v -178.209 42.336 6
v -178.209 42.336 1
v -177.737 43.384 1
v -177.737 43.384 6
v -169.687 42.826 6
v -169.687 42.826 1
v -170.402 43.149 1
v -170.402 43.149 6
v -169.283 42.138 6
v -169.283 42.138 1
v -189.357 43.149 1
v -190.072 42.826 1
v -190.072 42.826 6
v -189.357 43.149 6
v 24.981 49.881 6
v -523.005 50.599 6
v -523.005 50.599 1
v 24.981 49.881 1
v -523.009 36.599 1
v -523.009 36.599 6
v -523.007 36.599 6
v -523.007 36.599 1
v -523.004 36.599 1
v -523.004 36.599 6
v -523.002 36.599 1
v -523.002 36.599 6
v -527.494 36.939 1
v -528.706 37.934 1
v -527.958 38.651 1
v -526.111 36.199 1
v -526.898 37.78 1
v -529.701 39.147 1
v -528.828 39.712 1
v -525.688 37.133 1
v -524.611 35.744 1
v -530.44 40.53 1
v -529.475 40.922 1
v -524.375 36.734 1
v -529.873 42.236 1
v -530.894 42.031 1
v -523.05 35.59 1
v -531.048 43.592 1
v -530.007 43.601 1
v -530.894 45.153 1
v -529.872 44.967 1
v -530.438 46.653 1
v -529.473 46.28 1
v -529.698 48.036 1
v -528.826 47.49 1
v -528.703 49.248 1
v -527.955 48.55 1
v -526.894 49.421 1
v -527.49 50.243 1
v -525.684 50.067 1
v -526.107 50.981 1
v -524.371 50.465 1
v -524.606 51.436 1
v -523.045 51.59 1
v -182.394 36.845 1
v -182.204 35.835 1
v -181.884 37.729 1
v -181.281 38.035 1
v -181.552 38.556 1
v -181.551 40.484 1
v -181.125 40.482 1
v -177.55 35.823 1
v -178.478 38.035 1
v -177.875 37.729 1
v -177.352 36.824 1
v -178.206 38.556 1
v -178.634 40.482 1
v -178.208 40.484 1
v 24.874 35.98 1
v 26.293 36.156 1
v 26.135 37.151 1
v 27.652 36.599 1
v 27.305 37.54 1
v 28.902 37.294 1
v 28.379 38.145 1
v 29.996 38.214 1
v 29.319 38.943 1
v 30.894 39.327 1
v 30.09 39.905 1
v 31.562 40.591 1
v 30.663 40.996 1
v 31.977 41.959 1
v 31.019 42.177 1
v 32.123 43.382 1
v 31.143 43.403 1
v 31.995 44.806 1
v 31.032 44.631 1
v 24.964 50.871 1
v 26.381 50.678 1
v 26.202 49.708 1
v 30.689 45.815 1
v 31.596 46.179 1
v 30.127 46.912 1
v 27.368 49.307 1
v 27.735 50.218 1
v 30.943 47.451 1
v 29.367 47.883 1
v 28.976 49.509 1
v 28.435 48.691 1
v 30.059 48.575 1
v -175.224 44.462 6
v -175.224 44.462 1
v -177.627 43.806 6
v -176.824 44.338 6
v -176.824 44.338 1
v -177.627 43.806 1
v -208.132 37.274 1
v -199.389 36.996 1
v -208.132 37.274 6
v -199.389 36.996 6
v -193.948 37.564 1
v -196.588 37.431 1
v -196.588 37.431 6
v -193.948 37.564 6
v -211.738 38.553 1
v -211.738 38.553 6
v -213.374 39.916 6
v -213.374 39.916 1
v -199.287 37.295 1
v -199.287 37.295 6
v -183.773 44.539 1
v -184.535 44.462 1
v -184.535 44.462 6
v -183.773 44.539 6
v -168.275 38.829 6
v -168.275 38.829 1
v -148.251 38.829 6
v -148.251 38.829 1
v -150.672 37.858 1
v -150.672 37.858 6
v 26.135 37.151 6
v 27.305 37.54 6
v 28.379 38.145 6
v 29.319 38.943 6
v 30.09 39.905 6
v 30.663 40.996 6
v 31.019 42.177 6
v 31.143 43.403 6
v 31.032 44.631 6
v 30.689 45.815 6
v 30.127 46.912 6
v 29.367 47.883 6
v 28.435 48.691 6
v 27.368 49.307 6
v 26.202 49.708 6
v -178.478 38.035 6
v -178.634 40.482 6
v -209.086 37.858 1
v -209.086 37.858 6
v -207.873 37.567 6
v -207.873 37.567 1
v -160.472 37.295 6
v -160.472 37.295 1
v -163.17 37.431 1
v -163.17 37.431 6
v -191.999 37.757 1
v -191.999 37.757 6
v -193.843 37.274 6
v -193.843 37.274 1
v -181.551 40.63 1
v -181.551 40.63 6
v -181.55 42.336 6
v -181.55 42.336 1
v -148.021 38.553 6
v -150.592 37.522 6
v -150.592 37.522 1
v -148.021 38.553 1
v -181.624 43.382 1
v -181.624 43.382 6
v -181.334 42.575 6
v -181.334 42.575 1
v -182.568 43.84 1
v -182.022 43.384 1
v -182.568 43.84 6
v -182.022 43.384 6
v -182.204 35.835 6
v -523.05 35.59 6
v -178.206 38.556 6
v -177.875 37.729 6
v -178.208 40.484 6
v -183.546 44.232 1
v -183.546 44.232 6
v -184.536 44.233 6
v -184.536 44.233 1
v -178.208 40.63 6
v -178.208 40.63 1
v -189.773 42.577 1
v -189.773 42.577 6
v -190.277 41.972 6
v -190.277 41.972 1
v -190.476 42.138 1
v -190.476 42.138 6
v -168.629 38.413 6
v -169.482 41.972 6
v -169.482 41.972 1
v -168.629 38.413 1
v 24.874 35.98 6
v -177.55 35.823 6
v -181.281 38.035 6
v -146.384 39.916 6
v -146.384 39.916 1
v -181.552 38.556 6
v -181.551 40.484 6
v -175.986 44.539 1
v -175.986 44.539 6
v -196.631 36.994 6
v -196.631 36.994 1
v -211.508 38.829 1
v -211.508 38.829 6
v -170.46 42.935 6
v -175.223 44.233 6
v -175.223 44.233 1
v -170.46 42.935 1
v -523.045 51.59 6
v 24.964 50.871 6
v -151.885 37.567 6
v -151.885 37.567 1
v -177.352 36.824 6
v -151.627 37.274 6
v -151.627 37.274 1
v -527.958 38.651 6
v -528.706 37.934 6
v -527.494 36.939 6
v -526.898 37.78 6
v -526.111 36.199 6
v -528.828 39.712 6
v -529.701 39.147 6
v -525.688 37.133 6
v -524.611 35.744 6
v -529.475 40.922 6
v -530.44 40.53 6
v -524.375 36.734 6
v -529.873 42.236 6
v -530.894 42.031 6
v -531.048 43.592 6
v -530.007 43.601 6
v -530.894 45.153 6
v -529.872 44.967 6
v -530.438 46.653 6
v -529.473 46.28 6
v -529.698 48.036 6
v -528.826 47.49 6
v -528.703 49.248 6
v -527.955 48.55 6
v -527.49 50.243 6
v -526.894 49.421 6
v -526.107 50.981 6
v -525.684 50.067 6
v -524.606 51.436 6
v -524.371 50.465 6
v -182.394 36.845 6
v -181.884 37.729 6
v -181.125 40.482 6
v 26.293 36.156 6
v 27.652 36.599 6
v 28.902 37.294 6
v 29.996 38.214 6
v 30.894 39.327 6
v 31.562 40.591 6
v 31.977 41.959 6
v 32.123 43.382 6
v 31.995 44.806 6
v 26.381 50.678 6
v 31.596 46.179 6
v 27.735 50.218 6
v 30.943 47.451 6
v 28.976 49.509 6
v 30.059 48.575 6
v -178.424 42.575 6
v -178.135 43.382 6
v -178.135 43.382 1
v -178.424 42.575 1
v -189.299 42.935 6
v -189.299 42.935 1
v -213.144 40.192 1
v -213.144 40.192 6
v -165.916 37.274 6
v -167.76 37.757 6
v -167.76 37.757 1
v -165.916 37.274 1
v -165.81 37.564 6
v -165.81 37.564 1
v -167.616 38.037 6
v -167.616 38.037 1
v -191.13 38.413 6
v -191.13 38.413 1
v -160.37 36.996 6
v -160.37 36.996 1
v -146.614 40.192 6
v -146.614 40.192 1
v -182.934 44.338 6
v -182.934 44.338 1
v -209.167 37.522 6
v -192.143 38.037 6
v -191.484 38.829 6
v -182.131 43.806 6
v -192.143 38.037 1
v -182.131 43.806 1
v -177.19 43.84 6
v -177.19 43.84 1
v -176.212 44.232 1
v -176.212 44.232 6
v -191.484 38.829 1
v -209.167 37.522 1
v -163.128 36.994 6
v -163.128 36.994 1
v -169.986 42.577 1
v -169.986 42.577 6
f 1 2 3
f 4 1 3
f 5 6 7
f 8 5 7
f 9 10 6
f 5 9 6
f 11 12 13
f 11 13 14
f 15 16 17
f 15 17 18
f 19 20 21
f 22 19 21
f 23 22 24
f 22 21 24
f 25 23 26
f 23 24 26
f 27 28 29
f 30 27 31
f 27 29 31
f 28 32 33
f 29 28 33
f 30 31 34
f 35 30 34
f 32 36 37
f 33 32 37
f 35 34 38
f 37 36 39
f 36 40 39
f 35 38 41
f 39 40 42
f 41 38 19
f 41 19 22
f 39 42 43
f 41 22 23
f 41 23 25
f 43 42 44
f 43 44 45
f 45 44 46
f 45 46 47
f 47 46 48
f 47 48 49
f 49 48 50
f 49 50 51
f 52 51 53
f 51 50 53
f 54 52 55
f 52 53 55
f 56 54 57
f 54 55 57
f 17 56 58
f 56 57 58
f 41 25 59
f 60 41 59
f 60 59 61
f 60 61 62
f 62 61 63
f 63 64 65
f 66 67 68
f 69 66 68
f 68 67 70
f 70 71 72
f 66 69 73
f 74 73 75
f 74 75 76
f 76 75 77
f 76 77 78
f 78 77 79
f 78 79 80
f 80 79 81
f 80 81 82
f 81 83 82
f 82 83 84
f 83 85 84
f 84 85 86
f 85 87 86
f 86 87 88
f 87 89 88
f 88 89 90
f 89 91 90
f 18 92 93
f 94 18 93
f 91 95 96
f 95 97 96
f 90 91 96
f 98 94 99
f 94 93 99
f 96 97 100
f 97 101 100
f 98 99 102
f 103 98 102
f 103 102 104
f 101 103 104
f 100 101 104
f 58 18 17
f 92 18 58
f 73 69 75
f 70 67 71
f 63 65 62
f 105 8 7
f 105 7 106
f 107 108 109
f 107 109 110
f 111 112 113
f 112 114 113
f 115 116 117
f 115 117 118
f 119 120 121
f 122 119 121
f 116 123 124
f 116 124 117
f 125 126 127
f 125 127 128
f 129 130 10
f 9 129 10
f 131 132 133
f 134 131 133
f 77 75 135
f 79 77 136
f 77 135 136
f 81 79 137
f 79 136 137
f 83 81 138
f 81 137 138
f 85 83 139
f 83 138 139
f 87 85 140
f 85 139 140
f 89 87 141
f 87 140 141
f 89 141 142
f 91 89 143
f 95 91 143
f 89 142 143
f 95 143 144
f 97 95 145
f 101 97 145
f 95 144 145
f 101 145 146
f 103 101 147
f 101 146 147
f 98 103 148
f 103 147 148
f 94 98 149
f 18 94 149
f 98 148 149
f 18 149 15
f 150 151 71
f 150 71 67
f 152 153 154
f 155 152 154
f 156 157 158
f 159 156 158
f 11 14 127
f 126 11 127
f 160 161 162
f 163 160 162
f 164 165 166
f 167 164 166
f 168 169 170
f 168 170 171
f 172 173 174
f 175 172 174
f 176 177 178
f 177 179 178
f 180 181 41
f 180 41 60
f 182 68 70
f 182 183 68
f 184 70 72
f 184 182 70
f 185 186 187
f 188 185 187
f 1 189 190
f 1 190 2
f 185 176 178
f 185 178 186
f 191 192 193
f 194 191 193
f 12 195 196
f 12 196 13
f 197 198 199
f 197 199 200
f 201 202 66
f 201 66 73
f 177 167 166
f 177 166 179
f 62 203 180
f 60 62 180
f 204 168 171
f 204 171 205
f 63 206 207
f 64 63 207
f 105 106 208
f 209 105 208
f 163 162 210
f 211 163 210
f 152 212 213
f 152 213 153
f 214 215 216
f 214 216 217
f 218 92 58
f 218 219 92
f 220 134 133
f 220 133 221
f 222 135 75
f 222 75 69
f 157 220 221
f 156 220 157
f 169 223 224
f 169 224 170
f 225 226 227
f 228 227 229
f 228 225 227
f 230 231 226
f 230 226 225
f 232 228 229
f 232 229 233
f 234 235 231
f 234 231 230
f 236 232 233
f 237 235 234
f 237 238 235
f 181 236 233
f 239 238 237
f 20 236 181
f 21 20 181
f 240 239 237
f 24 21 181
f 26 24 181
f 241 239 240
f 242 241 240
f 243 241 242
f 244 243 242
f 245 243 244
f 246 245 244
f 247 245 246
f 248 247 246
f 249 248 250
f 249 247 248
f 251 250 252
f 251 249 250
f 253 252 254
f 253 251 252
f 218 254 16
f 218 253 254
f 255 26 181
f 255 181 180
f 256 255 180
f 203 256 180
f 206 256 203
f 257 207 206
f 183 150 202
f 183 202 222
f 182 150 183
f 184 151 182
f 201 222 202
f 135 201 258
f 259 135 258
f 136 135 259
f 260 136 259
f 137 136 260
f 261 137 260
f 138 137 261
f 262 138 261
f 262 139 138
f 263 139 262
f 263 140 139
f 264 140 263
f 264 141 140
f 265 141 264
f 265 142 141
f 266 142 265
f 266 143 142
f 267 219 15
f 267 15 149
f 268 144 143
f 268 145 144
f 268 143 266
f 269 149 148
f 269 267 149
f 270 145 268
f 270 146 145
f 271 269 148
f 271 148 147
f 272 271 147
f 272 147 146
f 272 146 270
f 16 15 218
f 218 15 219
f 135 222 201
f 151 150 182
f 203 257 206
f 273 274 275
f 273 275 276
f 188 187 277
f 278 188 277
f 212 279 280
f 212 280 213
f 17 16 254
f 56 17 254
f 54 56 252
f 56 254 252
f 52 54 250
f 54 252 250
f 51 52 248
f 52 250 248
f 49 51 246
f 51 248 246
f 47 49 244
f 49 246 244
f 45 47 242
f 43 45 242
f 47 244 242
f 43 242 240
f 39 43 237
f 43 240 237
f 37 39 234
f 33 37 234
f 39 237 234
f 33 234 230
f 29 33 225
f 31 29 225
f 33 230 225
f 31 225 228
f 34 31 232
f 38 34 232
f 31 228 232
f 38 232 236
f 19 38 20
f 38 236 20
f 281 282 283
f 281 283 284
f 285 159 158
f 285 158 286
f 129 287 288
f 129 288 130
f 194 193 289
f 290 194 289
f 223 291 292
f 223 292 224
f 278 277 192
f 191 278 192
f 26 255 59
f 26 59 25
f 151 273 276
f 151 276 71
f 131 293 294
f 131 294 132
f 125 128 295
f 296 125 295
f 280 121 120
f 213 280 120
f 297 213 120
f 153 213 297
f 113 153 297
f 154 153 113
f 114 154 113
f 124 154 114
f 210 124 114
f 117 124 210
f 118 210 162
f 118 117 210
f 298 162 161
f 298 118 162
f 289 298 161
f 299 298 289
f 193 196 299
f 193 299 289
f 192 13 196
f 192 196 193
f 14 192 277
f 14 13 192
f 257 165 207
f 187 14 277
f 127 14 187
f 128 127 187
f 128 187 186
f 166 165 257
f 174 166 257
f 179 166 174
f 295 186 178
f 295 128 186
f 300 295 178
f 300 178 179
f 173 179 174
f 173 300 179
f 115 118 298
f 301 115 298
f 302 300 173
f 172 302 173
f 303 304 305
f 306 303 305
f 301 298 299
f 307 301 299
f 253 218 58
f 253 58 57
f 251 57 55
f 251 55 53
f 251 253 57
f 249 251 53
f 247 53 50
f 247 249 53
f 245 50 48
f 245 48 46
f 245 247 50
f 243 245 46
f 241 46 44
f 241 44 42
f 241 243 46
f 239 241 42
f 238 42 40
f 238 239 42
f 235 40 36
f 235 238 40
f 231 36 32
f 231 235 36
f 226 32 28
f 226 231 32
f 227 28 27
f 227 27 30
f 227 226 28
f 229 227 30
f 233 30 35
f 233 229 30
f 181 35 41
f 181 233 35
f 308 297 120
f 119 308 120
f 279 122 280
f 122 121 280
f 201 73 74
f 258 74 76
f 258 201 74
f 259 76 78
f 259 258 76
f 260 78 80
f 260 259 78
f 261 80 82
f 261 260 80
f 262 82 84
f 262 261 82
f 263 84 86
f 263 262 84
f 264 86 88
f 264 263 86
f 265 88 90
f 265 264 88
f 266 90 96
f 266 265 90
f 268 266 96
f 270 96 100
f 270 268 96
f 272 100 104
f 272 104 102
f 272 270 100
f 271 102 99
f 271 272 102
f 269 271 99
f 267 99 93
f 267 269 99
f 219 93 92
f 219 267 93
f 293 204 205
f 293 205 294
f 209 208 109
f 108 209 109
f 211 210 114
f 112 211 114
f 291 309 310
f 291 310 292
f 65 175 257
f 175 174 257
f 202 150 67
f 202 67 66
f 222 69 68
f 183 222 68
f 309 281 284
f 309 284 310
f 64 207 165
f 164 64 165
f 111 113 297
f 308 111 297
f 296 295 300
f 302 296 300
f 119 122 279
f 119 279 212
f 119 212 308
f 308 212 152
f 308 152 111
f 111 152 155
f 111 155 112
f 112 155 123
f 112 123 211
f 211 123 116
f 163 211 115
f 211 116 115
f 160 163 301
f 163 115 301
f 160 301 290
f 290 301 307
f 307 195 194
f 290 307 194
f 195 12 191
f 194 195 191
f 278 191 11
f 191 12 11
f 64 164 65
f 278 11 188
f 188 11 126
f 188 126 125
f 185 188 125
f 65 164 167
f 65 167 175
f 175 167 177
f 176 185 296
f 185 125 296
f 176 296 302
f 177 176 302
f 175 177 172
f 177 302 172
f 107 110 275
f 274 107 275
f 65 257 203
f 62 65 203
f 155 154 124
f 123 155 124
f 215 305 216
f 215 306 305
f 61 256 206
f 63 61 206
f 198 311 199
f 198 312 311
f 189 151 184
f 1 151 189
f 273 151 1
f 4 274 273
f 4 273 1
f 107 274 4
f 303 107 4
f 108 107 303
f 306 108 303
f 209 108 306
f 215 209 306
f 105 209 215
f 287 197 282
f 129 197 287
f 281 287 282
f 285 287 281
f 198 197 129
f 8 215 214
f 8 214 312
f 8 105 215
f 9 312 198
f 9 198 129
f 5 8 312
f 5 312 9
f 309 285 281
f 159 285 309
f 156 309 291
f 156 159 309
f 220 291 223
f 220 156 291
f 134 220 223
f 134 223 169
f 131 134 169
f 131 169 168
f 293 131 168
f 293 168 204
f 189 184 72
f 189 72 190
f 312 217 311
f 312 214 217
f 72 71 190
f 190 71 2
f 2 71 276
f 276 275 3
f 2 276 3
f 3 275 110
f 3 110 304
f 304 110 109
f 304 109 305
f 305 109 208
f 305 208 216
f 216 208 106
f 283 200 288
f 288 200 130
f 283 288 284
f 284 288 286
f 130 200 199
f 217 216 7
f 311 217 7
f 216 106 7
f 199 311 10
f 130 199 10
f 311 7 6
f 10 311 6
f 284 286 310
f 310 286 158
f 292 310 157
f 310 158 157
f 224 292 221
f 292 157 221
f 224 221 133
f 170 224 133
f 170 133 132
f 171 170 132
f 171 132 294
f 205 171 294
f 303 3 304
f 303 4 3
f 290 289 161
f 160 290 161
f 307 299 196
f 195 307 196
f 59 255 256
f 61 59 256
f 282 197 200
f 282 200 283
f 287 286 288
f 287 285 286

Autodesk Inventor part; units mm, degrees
ref_plane "YZ Plane" through (0, 0, 0) normal (1, 0, 0) x (0, 1, 0)
ref_plane "XZ Plane" through (0, 0, 0) normal (0, 1, 0) x (-1, 0, 0)
ref_plane "XY Plane" through (0, 0, 0) normal (0, 0, 1) x (1, 0, 0)
ref_plane "Work Plane1" through (0, 0, 0) normal (0, 0, 1) x (1, 0, 0)
sketch "Sketch1" plane through (0, 0, 0) normal (0, 0, 1) x (1, 0, 0)
  arc A0 (24.6543, 36.9901) -> (24.6581, 49.8888) centre (24.6562, 43.4394) ccw
  arc A1 (-523.0049, 50.5993) -> (-523.009, 36.5993) centre (-523.014, 43.5993) ccw
  line L0 (-523.009, 36.5993) -> (24.8958, 36.9945)
  line L1 (24.9813, 49.8806) -> (-523.0049, 50.5993)
  line L2 (-523.0083, 35.5993) -> (24.9141, 35.9946)
  arc A2 (24.655, 35.9901) -> (24.666, 50.8888) centre (24.6562, 43.4394) ccw
  arc A3 (-523.0035, 51.5993) -> (-523.0083, 35.5993) centre (-523.014, 43.5993) ccw
  line L3 (-523.0035, 51.5993) -> (25.0062, 50.8806)
  point P0 (0, 0)
  dimension "d0" = 1
ref_plane "Work Plane2" through (0, 0, 6) normal (0, 0, 1) x (1, 0, 0)
sketch "Sketch2" plane through (0, 0, 6) normal (0, 0, 1) x (1, 0, 0)
  line L0 (-523.0049, 50.5993) -> (24.9813, 49.8806)
  arc A0 (26.1347, 37.1513) -> (24.9813, 49.8806) centre (24.6937, 43.4377) ccw
  arc A1 (-523.0049, 50.5993) -> (-523.0019, 36.5993) centre (-523.0069, 43.5993) ccw
  line L1 (-523.0501, 35.5895) -> (-182.2036, 35.8354)
  arc A2 (24.8737, 35.9804) -> (24.9644, 50.8708) centre (24.674, 43.4271) ccw
  line L2 (24.9644, 50.8708) -> (-523.0453, 51.5895)
  arc A3 (-523.0453, 51.5895) -> (-523.0501, 35.5895) centre (-523.0477, 43.5895) ccw
  line L3 (26.1347, 37.1513) -> (-177.3524, 36.8243)
  line L4 (26.1347, 37.1513) -> (-177.3524, 36.8243)
  line L5 (-177.55, 35.8233) -> (24.8737, 35.9804)
  line L6 (-182.3943, 36.845) -> (-523.0019, 36.5993)
  line L7 (-182.3943, 36.845) -> (-523.0019, 36.5993)
  line L8 (-182.3943, 36.845) -> (-523.009, 36.5993)
  arc A4 (-175.5981, 44.0056) -> (-177.8793, 42.0255) centre (-175.8793, 42.0255) ccw projected
  line L9 (-177.8793, 42.0255) -> (-177.8793, 38.1674) projected
  line L10 (-168.9783, 38.1674) -> (-177.8793, 38.1674) projected
  arc A5 (-168.9783, 38.1674) -> (-168.8741, 38.8755) centre (-169.5783, 38.6174) ccw projected
  line L11 (-168.8741, 38.8755) -> (-169.5014, 41.4937) projected
  arc A6 (-169.5014, 41.4937) -> (-170.852, 42.9373) centre (-171.4464, 41.0276) ccw projected
  arc A7 (-170.852, 42.9373) -> (-175.5981, 44.0056) centre (-179.8602, 13.9956) ccw projected
  arc A8 (-181.8793, 42.02) -> (-184.1633, 43.9998) centre (-183.8793, 42.02) ccw projected
  arc A9 (-184.1633, 43.9998) -> (-188.8754, 42.9351) centre (-179.8602, 13.9956) ccw projected
  arc A10 (-188.8754, 42.9351) -> (-190.223, 41.5019) centre (-188.2805, 41.0256) ccw projected
  line L12 (-190.223, 41.5019) -> (-190.8453, 38.9643) projected
  arc A11 (-190.8453, 38.9643) -> (-190.7804, 38.1674) centre (-190.1804, 38.6174) ccw projected
  line L13 (-181.8793, 38.1674) -> (-190.7804, 38.1674) projected
  line L14 (-181.8793, 42.02) -> (-181.8793, 38.1674) projected
  line L15 (-177.3524, 36.8243) -> (-177.8746, 37.7286)
  line L16 (-177.8746, 37.7286) -> (-178.2063, 38.5555)
  line L17 (-178.2063, 38.5555) -> (-178.2078, 40.6305)
  line L18 (-178.2078, 40.6305) -> (-178.209, 42.3362)
  line L19 (-178.209, 42.3362) -> (-177.737, 43.3845)
  line L20 (-177.737, 43.3845) -> (-177.1904, 43.8398)
  line L21 (-177.1904, 43.8398) -> (-176.2125, 44.2321)
  line L22 (-176.2125, 44.2321) -> (-175.2227, 44.2328)
  line L23 (-175.2227, 44.2328) -> (-170.4599, 42.9351)
  line L24 (-170.4599, 42.9351) -> (-169.9859, 42.5772)
  line L25 (-169.9859, 42.5772) -> (-169.4819, 41.9721)
  line L26 (-169.4819, 41.9721) -> (-168.629, 38.4129)
  line L27 (-168.629, 38.4129) -> (-167.76, 37.7567)
  line L28 (-167.76, 37.7567) -> (-165.9159, 37.2737)
  line L29 (-165.9159, 37.2737) -> (-163.1275, 36.9945)
  line L30 (-163.1275, 36.9945) -> (-160.3695, 36.9965)
  line L31 (-160.3695, 36.9965) -> (-151.627, 37.2737)
  line L32 (-151.627, 37.2737) -> (-150.5918, 37.5217)
  line L33 (-150.5918, 37.5217) -> (-148.0211, 38.5527)
  line L34 (-148.0211, 38.5527) -> (-146.3842, 39.9163)
  line L35 (-146.3842, 39.9163) -> (-146.6143, 40.1925)
  line L36 (-146.6143, 40.1925) -> (-148.2512, 38.8289)
  line L37 (-148.2512, 38.8289) -> (-150.6724, 37.8579)
  line L38 (-150.6724, 37.8579) -> (-151.8853, 37.5672)
  line L39 (-151.8853, 37.5672) -> (-160.472, 37.295)
  line L40 (-160.472, 37.295) -> (-163.1702, 37.4311)
  line L41 (-163.1702, 37.4311) -> (-165.8102, 37.5643)
  line L42 (-165.8102, 37.5643) -> (-167.6157, 38.0372)
  line L43 (-167.6157, 38.0372) -> (-168.2752, 38.8289)
  line L44 (-168.2752, 38.8289) -> (-169.2827, 42.138)
  line L45 (-169.2827, 42.138) -> (-169.6866, 42.8265)
  line L46 (-169.6866, 42.8265) -> (-170.4021, 43.1486)
  line L47 (-170.4021, 43.1486) -> (-175.2236, 44.4623)
  line L48 (-175.2236, 44.4623) -> (-175.9859, 44.5387)
  line L49 (-175.9859, 44.5387) -> (-176.8242, 44.3378)
  line L50 (-176.8242, 44.3378) -> (-177.6272, 43.8055)
  line L51 (-177.6272, 43.8055) -> (-178.135, 43.3825)
  line L52 (-178.135, 43.3825) -> (-178.4245, 42.5752)
  line L53 (-178.4245, 42.5752) -> (-178.6341, 40.4815)
  line L54 (-178.6341, 40.4815) -> (-178.4776, 38.0352)
  line L55 (-178.4776, 38.0352) -> (-177.55, 35.8233)
  line L56 (-177.8793, 40.4835) -> (-181.8793, 40.4835)
  line L57 (-179.8793, 40.4835) -> (-179.8793, 39.2603)
  arc A12 (-181.8793, 42.0255) -> (-184.1606, 44.0056) centre (-183.8793, 42.0255) ccw
  line L58 (-181.8793, 42.0255) -> (-181.8793, 38.1674)
  line L59 (-190.7804, 38.1674) -> (-181.8793, 38.1674)
  arc A13 (-190.8846, 38.8755) -> (-190.7804, 38.1674) centre (-190.1804, 38.6174) ccw
  line L60 (-190.8846, 38.8755) -> (-190.2572, 41.4937)
  arc A14 (-188.9067, 42.9373) -> (-190.2572, 41.4937) centre (-188.3123, 41.0276) ccw
  arc A15 (-184.1606, 44.0056) -> (-188.9067, 42.9373) centre (-179.8985, 13.9956) ccw
  line L61 (-182.3943, 36.845) -> (-181.8841, 37.7286)
  line L62 (-181.8841, 37.7286) -> (-181.5524, 38.5555)
  line L63 (-181.5524, 38.5555) -> (-181.5509, 40.6305)
  line L64 (-181.5509, 40.6305) -> (-181.5497, 42.3362)
  line L65 (-181.5497, 42.3362) -> (-182.0217, 43.3845)
  line L66 (-182.0217, 43.3845) -> (-182.5683, 43.8398)
  line L67 (-182.5683, 43.8398) -> (-183.5462, 44.2321)
  line L68 (-183.5462, 44.2321) -> (-184.536, 44.2328)
  line L69 (-184.536, 44.2328) -> (-189.2987, 42.9351)
  line L70 (-189.2987, 42.9351) -> (-189.7728, 42.5772)
  line L71 (-189.7728, 42.5772) -> (-190.2768, 41.9721)
  line L72 (-190.2768, 41.9721) -> (-191.1297, 38.4129)
  line L73 (-191.1297, 38.4129) -> (-191.9987, 37.7567)
  line L74 (-191.9987, 37.7567) -> (-193.8428, 37.2737)
  line L75 (-193.8428, 37.2737) -> (-196.6311, 36.9945)
  line L76 (-196.6311, 36.9945) -> (-199.3891, 36.9965)
  line L77 (-199.3891, 36.9965) -> (-208.1317, 37.2737)
  line L78 (-208.1317, 37.2737) -> (-209.1668, 37.5217)
  line L79 (-209.1668, 37.5217) -> (-211.7376, 38.5527)
  line L80 (-211.7376, 38.5527) -> (-213.3745, 39.9163)
  line L81 (-213.3745, 39.9163) -> (-213.1444, 40.1925)
  line L82 (-213.1444, 40.1925) -> (-211.5075, 38.8289)
  line L83 (-211.5075, 38.8289) -> (-209.0863, 37.8579)
  line L84 (-209.0863, 37.8579) -> (-207.8734, 37.5672)
  line L85 (-207.8734, 37.5672) -> (-199.2867, 37.295)
  line L86 (-199.2867, 37.295) -> (-196.5885, 37.4311)
  line L87 (-196.5885, 37.4311) -> (-193.9485, 37.5643)
  line L88 (-193.9485, 37.5643) -> (-192.143, 38.0372)
  line L89 (-192.143, 38.0372) -> (-191.4835, 38.8289)
  line L90 (-191.4835, 38.8289) -> (-190.476, 42.138)
  line L91 (-190.476, 42.138) -> (-190.0721, 42.8265)
  line L92 (-190.0721, 42.8265) -> (-189.3566, 43.1486)
  line L93 (-189.3566, 43.1486) -> (-184.5351, 44.4623)
  line L94 (-184.5351, 44.4623) -> (-183.7728, 44.5387)
  line L95 (-183.7728, 44.5387) -> (-182.9345, 44.3378)
  line L96 (-182.9345, 44.3378) -> (-182.1314, 43.8055)
  line L97 (-182.1314, 43.8055) -> (-181.6237, 43.3825)
  line L98 (-181.6237, 43.3825) -> (-181.3342, 42.5752)
  line L99 (-181.3342, 42.5752) -> (-181.1246, 40.4815)
  line L100 (-181.1246, 40.4815) -> (-181.2811, 38.0352)
  line L101 (-181.2811, 38.0352) -> (-182.2036, 35.8354)
  point P0 (-182.2087, 35.8233)
  point P1 (-182.4063, 36.8243)
extrude "Extrusion2" add sketch "Sketch2" against normal blind 5 contours A1 L6 L61 L62 L63 L56 L100 L101 L1 A3 L2 A2 L5 L55 L54 L17 L16 L15 L3 A0 L0 | L56 L53 L52 L51 L50 L49 L48 L47 L46 L45 L44 L43 L42 L41 L40 L39 L38 L37 L36 L35 L34 L33 L32 L31 L30 L29 L28 L27 L26 L25 L24 L23 L22 L21 L20 L19 L18 L17 | L63 L64 L65 L66 L67 L68 L69 L70 L71 L72 L73 L74 L75 L76 L77 L78 L79 L80 L81 L82 L83 L84 L85 L86 L87 L88 L89 L90 L91 L92 L93 L94 L95 L96 L97 L98 L99 L56
properties part number "XBELT"
